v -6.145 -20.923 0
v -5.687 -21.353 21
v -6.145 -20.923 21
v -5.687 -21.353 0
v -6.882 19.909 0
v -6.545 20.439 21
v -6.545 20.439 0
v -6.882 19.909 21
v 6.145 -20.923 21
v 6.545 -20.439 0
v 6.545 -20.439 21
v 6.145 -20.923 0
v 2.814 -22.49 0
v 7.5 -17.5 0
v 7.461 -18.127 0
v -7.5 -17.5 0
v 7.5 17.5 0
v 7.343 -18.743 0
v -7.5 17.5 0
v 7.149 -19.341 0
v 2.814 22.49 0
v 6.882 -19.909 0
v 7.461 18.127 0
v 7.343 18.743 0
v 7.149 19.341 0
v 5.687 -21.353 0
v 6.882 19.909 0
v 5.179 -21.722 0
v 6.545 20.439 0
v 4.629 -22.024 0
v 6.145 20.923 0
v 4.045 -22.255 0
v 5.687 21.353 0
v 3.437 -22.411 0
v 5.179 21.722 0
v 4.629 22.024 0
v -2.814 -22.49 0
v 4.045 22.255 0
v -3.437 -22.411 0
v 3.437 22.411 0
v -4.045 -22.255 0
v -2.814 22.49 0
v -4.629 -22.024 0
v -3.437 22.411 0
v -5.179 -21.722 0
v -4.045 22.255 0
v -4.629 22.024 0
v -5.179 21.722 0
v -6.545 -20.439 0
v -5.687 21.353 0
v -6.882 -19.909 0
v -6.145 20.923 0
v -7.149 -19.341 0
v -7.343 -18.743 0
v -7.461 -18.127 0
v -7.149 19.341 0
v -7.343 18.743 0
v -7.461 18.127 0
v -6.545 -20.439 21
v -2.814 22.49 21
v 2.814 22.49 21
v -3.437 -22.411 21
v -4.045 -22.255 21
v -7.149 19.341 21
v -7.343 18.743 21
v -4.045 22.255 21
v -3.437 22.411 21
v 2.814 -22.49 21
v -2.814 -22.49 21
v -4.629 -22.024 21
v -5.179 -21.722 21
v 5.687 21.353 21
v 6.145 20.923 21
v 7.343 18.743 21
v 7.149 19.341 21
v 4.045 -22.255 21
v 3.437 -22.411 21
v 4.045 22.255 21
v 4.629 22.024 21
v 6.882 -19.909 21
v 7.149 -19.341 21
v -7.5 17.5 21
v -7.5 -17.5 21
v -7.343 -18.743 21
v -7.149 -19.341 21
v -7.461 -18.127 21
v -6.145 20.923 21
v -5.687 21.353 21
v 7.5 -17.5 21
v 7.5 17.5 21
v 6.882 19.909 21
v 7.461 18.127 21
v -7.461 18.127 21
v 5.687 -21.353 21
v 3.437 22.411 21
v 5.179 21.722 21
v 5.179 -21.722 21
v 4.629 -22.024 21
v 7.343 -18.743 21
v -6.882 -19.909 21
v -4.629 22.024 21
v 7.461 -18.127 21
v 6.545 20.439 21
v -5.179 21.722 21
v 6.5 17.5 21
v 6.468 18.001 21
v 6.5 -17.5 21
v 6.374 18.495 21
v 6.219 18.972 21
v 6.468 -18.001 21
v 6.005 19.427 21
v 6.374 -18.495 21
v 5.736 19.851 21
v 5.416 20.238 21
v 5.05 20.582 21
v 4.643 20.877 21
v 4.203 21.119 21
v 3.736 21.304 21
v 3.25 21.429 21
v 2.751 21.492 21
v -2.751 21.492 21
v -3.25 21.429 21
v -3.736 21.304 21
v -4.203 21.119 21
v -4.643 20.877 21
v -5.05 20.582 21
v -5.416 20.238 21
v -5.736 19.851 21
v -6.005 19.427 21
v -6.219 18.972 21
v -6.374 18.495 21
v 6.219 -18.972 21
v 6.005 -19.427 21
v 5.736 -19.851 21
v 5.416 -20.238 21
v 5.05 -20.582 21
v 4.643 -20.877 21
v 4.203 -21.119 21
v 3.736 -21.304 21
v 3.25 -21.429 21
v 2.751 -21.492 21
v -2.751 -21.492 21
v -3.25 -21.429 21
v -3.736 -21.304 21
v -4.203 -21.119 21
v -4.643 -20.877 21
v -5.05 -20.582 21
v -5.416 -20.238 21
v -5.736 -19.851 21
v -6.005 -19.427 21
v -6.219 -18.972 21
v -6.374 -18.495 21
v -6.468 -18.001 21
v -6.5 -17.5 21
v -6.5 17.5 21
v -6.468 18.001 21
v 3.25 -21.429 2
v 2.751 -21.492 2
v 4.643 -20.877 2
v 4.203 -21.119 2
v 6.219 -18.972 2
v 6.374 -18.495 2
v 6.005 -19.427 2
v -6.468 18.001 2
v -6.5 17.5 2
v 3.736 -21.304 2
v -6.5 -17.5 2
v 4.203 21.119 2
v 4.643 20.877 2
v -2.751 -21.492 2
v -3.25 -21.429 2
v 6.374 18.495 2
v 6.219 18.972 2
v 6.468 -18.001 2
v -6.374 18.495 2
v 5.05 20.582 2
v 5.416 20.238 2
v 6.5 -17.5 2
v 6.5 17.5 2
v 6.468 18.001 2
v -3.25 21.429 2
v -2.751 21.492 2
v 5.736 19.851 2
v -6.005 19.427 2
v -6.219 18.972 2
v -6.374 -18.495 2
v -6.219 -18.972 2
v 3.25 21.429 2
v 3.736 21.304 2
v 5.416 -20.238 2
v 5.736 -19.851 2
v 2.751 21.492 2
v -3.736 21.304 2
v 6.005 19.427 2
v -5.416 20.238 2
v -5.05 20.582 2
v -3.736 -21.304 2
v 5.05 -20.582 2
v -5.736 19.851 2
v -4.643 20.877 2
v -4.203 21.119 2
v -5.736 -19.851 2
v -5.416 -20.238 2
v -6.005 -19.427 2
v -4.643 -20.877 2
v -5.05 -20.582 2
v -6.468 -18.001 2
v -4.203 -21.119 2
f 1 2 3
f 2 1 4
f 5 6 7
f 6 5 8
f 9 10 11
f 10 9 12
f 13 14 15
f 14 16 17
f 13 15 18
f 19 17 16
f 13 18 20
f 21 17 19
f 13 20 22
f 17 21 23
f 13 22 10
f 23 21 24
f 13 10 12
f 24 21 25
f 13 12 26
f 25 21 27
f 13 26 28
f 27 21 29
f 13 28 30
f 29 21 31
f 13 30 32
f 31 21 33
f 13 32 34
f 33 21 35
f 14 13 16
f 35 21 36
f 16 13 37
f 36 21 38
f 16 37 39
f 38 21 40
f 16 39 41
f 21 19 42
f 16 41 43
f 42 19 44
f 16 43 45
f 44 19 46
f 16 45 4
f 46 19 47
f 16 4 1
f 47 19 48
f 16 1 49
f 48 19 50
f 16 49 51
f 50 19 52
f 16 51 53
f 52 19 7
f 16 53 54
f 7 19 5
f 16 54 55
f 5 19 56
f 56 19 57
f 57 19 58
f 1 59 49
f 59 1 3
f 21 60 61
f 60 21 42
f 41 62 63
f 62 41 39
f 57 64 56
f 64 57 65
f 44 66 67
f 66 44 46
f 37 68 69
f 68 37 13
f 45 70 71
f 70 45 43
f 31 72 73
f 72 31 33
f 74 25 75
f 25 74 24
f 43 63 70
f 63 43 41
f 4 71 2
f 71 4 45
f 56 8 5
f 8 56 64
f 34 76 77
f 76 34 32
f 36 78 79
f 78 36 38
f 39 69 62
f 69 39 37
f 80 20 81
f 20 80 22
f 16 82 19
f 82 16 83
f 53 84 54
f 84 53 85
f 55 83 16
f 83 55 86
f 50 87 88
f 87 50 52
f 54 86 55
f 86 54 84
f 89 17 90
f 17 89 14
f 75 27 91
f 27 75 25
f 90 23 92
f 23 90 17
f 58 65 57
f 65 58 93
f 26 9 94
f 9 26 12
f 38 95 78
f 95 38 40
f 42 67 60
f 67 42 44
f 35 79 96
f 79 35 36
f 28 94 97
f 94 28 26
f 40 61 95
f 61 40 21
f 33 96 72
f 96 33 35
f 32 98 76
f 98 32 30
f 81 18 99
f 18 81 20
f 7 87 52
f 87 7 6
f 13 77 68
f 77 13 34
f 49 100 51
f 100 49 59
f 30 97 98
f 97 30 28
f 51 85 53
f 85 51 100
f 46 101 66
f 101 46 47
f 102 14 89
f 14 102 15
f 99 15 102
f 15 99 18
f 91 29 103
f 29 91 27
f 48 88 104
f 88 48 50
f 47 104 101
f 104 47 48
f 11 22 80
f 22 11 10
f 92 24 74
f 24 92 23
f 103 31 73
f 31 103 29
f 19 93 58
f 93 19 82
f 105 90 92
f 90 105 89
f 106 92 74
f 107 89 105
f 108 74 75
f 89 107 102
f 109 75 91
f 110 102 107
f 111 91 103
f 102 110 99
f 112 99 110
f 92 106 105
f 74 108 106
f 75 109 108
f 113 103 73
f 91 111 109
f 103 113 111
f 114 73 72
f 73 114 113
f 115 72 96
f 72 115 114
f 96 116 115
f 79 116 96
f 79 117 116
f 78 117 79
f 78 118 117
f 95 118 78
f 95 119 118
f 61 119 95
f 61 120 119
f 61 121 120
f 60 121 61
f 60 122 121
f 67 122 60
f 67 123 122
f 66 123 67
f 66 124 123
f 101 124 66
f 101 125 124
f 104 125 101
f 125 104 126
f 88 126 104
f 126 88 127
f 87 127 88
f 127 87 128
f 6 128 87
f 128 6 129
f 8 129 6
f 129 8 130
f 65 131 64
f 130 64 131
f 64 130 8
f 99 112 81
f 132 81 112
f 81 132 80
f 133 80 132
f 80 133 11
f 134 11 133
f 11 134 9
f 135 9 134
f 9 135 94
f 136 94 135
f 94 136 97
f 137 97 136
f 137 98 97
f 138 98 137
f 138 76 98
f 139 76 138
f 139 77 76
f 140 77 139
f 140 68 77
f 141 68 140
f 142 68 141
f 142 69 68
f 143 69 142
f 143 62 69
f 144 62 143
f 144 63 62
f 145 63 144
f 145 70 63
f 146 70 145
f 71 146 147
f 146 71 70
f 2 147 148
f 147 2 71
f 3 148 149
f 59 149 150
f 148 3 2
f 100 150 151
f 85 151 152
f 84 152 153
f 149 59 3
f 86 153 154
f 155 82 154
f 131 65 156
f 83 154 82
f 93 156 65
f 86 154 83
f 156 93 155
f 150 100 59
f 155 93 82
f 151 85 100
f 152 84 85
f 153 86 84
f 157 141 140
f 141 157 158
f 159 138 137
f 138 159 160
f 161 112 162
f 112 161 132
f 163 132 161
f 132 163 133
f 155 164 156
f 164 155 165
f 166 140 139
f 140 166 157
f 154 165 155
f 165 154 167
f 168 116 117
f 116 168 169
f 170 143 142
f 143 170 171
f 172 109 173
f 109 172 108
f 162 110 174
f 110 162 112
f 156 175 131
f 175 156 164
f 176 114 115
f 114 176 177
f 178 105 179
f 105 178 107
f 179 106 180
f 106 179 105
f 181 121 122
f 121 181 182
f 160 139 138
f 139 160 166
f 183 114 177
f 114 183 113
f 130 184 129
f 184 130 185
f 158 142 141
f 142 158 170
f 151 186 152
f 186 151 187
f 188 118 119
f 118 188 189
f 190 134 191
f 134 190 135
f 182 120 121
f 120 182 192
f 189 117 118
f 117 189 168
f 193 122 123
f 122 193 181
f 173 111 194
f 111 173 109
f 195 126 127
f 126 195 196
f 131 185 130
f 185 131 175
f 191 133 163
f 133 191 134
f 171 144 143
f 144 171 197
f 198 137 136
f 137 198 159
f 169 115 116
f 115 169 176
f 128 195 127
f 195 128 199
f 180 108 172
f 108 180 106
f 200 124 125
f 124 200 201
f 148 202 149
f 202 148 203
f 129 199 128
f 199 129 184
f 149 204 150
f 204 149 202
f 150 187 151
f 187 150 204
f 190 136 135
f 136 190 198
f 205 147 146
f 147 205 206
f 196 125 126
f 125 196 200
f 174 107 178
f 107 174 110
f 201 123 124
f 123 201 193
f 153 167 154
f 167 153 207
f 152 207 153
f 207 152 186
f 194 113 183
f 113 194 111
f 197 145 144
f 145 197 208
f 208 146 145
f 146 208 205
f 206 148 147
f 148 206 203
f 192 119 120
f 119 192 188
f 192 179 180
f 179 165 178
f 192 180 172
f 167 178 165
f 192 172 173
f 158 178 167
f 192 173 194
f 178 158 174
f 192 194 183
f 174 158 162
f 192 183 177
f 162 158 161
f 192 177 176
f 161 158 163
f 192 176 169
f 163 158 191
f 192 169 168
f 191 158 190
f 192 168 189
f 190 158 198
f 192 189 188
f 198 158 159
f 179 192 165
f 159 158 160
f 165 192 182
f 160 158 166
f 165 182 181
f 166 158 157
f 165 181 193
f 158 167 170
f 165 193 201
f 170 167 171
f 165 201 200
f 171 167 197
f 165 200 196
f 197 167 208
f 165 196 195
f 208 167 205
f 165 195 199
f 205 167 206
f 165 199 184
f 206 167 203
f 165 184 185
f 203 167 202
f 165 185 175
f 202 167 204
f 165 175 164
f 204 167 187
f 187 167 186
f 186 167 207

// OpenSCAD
$fn = 50;


difference() {
	union() {
		hull() {
			translate(v = [-2.5000000000, 17.5000000000, 0]) {
				cylinder(h = 21, r = 5);
			}
			translate(v = [2.5000000000, 17.5000000000, 0]) {
				cylinder(h = 21, r = 5);
			}
			translate(v = [-2.5000000000, -17.5000000000, 0]) {
				cylinder(h = 21, r = 5);
			}
			translate(v = [2.5000000000, -17.5000000000, 0]) {
				cylinder(h = 21, r = 5);
			}
		}
	}
	union() {
		translate(v = [0, 0, 2]) {
			hull() {
				translate(v = [-2.5000000000, 17.5000000000, 0]) {
					cylinder(h = 19, r = 4);
				}
				translate(v = [2.5000000000, 17.5000000000, 0]) {
					cylinder(h = 19, r = 4);
				}
				translate(v = [-2.5000000000, -17.5000000000, 0]) {
					cylinder(h = 19, r = 4);
				}
				translate(v = [2.5000000000, -17.5000000000, 0]) {
					cylinder(h = 19, r = 4);
				}
			}
		}
	}
}
